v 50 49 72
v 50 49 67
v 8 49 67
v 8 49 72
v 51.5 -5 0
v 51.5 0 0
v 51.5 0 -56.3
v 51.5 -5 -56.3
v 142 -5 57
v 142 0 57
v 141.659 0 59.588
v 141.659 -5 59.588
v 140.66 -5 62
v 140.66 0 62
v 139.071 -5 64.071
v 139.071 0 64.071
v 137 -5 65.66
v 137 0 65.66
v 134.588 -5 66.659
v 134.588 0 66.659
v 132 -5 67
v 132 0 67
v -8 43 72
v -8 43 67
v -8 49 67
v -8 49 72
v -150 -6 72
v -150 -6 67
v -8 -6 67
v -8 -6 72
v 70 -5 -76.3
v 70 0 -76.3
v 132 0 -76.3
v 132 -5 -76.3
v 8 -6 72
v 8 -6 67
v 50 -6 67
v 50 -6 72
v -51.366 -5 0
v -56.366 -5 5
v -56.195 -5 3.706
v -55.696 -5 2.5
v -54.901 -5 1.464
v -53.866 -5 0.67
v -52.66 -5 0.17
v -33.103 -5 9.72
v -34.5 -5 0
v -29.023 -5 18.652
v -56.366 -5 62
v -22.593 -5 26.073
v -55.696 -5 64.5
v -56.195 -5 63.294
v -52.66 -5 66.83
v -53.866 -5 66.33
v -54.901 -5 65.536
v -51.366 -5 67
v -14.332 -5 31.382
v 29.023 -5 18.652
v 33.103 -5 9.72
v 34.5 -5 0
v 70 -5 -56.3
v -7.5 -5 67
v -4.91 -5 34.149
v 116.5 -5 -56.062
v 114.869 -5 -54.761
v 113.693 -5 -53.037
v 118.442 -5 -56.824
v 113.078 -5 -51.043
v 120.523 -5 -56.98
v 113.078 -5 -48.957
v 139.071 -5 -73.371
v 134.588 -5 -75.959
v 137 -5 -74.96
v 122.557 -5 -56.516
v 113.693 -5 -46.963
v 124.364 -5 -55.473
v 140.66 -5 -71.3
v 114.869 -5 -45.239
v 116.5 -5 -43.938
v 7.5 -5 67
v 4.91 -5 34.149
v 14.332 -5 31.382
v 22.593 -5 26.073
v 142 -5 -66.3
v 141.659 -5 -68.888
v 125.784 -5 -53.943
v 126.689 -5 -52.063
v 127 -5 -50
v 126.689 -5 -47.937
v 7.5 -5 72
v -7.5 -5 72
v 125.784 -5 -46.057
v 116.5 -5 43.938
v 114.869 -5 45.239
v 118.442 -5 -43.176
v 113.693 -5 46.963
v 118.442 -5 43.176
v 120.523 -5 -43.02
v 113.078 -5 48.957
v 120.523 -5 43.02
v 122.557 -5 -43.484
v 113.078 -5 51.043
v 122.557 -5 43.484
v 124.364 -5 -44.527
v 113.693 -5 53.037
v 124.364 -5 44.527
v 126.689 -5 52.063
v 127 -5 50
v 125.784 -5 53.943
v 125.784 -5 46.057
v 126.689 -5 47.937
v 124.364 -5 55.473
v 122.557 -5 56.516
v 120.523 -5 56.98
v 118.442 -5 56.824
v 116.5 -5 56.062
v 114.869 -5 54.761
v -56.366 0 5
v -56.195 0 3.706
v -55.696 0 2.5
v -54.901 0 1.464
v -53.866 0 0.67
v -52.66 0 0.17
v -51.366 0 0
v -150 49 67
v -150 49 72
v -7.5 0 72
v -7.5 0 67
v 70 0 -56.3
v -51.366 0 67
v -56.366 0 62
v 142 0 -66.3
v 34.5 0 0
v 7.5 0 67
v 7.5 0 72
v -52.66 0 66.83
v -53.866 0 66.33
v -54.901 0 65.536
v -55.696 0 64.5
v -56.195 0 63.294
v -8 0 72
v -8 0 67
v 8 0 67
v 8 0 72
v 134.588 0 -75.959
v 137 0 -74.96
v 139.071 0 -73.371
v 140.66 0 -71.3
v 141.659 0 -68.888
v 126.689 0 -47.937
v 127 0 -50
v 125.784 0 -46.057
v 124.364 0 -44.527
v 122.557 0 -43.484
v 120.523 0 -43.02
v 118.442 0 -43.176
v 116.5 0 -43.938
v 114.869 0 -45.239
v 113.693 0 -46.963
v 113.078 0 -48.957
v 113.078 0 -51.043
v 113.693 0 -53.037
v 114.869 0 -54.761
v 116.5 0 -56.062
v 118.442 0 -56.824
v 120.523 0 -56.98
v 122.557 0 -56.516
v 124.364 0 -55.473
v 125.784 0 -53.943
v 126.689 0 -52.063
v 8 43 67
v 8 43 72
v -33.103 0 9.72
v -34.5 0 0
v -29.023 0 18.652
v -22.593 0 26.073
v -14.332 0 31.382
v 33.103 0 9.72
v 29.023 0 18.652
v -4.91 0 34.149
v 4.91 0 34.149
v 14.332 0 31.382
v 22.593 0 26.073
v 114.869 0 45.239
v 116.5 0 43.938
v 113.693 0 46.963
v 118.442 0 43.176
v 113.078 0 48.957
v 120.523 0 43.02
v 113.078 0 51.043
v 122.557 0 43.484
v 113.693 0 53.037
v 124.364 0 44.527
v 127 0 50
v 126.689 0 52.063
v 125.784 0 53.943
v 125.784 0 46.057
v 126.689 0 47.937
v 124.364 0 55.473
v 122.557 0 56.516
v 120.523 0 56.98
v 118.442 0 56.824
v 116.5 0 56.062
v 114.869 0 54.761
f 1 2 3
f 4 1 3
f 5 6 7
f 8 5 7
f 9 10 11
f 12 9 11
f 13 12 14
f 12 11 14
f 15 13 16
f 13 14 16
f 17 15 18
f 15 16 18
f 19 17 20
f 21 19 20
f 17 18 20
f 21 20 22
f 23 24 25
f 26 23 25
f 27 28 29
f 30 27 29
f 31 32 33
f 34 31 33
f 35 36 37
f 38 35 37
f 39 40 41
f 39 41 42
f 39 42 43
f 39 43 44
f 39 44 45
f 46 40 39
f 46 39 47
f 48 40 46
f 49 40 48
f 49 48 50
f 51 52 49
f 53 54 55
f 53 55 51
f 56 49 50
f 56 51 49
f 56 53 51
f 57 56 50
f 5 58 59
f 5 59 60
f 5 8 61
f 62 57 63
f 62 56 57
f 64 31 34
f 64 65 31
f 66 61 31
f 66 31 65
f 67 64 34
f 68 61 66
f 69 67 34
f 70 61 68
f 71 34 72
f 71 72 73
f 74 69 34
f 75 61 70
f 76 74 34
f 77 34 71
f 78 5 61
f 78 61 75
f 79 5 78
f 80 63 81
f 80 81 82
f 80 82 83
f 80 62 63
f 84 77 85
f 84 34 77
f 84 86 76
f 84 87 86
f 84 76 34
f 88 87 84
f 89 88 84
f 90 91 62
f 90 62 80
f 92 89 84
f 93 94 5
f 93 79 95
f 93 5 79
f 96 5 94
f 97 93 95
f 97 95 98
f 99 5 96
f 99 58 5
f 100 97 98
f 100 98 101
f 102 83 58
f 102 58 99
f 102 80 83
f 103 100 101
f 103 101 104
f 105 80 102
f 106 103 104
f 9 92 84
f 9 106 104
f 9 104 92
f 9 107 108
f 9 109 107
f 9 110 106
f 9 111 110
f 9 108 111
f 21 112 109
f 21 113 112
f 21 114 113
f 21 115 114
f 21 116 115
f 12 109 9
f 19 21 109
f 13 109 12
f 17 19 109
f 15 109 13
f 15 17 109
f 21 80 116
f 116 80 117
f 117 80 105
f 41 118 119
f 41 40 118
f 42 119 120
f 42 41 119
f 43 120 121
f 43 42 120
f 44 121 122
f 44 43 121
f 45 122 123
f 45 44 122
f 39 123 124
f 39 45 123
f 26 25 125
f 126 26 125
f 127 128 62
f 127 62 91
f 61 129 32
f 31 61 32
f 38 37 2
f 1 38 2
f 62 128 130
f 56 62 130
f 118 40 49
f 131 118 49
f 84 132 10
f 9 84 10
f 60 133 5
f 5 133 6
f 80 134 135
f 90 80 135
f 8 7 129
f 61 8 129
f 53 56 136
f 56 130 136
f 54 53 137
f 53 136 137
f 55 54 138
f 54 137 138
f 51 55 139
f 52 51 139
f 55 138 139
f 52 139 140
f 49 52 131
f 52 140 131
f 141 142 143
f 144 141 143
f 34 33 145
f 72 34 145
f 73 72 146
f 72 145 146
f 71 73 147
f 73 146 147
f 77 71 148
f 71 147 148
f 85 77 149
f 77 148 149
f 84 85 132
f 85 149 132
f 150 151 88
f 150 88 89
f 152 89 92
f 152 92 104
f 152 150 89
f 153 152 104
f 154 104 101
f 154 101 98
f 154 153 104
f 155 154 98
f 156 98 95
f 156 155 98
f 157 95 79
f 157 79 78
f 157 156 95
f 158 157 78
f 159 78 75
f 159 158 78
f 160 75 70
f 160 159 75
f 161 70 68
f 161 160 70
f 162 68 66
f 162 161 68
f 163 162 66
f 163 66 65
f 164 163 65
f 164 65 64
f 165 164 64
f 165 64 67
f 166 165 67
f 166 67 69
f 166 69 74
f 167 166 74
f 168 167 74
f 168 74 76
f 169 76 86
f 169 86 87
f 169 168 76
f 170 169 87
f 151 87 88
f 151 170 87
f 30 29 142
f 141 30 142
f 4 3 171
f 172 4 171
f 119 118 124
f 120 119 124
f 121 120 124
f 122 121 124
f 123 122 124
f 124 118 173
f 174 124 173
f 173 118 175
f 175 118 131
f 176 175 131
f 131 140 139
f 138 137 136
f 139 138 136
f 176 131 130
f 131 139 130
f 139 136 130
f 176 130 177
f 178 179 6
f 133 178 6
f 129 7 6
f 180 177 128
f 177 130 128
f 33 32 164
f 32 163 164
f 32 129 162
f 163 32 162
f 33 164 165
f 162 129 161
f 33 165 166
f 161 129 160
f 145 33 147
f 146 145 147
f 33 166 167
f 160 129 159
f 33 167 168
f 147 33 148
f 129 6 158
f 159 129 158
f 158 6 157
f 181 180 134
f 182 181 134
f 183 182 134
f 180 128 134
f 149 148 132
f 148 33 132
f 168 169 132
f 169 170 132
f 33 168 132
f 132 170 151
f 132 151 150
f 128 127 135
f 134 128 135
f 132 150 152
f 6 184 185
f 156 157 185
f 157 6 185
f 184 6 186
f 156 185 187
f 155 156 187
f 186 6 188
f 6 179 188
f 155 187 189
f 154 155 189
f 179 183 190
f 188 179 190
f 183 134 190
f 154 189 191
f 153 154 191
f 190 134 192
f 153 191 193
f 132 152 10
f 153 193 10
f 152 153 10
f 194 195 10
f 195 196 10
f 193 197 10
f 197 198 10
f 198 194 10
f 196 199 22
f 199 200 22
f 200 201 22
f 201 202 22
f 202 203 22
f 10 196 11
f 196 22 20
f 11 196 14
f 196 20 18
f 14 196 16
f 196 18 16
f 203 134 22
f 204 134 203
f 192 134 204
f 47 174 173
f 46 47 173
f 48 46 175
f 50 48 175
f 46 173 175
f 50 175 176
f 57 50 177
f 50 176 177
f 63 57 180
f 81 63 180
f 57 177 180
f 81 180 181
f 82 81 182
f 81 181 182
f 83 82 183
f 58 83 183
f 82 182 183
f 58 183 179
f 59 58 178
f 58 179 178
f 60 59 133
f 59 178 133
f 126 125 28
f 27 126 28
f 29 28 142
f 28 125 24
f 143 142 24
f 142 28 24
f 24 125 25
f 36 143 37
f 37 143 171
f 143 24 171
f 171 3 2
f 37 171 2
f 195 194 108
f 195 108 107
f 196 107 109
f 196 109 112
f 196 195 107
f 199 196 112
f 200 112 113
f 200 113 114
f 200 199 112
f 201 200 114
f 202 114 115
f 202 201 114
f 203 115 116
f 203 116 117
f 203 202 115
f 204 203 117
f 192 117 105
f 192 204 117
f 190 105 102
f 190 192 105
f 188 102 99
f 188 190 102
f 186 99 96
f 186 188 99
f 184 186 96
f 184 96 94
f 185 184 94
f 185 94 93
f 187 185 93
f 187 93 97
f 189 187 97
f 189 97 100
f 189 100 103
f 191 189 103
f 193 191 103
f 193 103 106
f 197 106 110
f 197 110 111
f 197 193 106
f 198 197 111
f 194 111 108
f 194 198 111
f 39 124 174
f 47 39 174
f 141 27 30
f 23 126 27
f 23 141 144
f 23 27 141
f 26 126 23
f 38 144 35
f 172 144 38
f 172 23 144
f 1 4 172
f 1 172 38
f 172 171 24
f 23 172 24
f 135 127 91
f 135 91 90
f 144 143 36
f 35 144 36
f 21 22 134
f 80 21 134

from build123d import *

# Parameters (mm, degrees)
F0_R     = 7
F0_W     = 15
F0_H     = 5
F1_DEPTH = 5
F3_DEPTH = 5
F5_DEPTH = 25
F6_R     = 5


with BuildPart() as f1:
    # F0 (on Front) → F1 (new body)
    with BuildSketch(Plane.XZ):
        with BuildLine():
            Line((-7.5, 67), (-112.4850192021, 67))
            ThreePointArc((-112.4850192021, 67), (-121.8835509134, 60.4157871235), (-118.9056959219, 49.3335203346))
            Line((-118.9056959219, 49.3335203346), (-62.7862929368, 2.3335203346))
            ThreePointArc((-62.7862929368, 2.3335203346), (-59.7814033405, 0.6014682888), (-56.365616217, 0))
            Line((-56.365616217, 0), (-34.5, 0))
            ThreePointArc((-34.5, 0), (0, 34.5), (34.5, 0))
            Line((34.5, 0), (51.5, 0))
            Line((51.5, 0), (51.5, -56.3))
            Line((51.5, -56.3), (70, -56.3))
            Line((70, -56.3), (70, -76.3))
            Line((70, -76.3), (132, -76.3))
            ThreePointArc((132, -76.3), (139.0710678119, -73.3710678119), (142, -66.3))
            Line((142, -66.3), (142, 57))
            ThreePointArc((142, 57), (139.0710678119, 64.0710678119), (132, 67))
            Line((132, 67), (7.5, 67))
            Line((7.5, 67), (-7.5, 67))
        make_face()
        with Locations((120, -50)):
            Circle(F0_R, mode=Mode.SUBTRACT)
        with Locations((120, 50)):
            Circle(F0_R, mode=Mode.SUBTRACT)
        with Locations((0, 69.5)):
            Rectangle(F0_W, F0_H)
    extrude(amount=F1_DEPTH)

    # F4 (on face) → F5 (cut)
    with BuildSketch(Plane.XZ.offset(5)):
        with BuildLine():
            ThreePointArc((-62.7862929368, 2.3335203346), (-59.7814033405, 0.6014682888), (-56.365616217, 0))
            Line((-56.365616217, 0), (-56.365616217, 67))
            Line((-56.365616217, 67), (-112.4850192021, 67))
            ThreePointArc((-112.4850192021, 67), (-121.8835509134, 60.4157871235), (-118.9056959219, 49.3335203346))
            Line((-118.9056959219, 49.3335203346), (-62.7862929368, 2.3335203346))
        make_face()
    extrude(amount=-F5_DEPTH, mode=Mode.SUBTRACT)

    # F6
    f6_edges = [f1.edges().sort_by_distance(p)[0] for p in [
        (-56.365616, -2.5, 67),
        (-56.365616, -2.5, 0),
    ]]
    fillet(f6_edges, radius=F6_R)


with BuildPart() as f3:
    # F2 (on face) → F3 (new body)
    with BuildSketch(Plane.XY.offset(67)):
        Polygon((8, -6), (50, -6), (50, 49), (8, 49), (8, 43), (-8, 43), (-8, 49), (-150, 49), (-150, -6), (-8, -6), (-8, 0), (8, 0), align=None)
    extrude(amount=F3_DEPTH)


solid = Compound([f1.part, f3.part])
